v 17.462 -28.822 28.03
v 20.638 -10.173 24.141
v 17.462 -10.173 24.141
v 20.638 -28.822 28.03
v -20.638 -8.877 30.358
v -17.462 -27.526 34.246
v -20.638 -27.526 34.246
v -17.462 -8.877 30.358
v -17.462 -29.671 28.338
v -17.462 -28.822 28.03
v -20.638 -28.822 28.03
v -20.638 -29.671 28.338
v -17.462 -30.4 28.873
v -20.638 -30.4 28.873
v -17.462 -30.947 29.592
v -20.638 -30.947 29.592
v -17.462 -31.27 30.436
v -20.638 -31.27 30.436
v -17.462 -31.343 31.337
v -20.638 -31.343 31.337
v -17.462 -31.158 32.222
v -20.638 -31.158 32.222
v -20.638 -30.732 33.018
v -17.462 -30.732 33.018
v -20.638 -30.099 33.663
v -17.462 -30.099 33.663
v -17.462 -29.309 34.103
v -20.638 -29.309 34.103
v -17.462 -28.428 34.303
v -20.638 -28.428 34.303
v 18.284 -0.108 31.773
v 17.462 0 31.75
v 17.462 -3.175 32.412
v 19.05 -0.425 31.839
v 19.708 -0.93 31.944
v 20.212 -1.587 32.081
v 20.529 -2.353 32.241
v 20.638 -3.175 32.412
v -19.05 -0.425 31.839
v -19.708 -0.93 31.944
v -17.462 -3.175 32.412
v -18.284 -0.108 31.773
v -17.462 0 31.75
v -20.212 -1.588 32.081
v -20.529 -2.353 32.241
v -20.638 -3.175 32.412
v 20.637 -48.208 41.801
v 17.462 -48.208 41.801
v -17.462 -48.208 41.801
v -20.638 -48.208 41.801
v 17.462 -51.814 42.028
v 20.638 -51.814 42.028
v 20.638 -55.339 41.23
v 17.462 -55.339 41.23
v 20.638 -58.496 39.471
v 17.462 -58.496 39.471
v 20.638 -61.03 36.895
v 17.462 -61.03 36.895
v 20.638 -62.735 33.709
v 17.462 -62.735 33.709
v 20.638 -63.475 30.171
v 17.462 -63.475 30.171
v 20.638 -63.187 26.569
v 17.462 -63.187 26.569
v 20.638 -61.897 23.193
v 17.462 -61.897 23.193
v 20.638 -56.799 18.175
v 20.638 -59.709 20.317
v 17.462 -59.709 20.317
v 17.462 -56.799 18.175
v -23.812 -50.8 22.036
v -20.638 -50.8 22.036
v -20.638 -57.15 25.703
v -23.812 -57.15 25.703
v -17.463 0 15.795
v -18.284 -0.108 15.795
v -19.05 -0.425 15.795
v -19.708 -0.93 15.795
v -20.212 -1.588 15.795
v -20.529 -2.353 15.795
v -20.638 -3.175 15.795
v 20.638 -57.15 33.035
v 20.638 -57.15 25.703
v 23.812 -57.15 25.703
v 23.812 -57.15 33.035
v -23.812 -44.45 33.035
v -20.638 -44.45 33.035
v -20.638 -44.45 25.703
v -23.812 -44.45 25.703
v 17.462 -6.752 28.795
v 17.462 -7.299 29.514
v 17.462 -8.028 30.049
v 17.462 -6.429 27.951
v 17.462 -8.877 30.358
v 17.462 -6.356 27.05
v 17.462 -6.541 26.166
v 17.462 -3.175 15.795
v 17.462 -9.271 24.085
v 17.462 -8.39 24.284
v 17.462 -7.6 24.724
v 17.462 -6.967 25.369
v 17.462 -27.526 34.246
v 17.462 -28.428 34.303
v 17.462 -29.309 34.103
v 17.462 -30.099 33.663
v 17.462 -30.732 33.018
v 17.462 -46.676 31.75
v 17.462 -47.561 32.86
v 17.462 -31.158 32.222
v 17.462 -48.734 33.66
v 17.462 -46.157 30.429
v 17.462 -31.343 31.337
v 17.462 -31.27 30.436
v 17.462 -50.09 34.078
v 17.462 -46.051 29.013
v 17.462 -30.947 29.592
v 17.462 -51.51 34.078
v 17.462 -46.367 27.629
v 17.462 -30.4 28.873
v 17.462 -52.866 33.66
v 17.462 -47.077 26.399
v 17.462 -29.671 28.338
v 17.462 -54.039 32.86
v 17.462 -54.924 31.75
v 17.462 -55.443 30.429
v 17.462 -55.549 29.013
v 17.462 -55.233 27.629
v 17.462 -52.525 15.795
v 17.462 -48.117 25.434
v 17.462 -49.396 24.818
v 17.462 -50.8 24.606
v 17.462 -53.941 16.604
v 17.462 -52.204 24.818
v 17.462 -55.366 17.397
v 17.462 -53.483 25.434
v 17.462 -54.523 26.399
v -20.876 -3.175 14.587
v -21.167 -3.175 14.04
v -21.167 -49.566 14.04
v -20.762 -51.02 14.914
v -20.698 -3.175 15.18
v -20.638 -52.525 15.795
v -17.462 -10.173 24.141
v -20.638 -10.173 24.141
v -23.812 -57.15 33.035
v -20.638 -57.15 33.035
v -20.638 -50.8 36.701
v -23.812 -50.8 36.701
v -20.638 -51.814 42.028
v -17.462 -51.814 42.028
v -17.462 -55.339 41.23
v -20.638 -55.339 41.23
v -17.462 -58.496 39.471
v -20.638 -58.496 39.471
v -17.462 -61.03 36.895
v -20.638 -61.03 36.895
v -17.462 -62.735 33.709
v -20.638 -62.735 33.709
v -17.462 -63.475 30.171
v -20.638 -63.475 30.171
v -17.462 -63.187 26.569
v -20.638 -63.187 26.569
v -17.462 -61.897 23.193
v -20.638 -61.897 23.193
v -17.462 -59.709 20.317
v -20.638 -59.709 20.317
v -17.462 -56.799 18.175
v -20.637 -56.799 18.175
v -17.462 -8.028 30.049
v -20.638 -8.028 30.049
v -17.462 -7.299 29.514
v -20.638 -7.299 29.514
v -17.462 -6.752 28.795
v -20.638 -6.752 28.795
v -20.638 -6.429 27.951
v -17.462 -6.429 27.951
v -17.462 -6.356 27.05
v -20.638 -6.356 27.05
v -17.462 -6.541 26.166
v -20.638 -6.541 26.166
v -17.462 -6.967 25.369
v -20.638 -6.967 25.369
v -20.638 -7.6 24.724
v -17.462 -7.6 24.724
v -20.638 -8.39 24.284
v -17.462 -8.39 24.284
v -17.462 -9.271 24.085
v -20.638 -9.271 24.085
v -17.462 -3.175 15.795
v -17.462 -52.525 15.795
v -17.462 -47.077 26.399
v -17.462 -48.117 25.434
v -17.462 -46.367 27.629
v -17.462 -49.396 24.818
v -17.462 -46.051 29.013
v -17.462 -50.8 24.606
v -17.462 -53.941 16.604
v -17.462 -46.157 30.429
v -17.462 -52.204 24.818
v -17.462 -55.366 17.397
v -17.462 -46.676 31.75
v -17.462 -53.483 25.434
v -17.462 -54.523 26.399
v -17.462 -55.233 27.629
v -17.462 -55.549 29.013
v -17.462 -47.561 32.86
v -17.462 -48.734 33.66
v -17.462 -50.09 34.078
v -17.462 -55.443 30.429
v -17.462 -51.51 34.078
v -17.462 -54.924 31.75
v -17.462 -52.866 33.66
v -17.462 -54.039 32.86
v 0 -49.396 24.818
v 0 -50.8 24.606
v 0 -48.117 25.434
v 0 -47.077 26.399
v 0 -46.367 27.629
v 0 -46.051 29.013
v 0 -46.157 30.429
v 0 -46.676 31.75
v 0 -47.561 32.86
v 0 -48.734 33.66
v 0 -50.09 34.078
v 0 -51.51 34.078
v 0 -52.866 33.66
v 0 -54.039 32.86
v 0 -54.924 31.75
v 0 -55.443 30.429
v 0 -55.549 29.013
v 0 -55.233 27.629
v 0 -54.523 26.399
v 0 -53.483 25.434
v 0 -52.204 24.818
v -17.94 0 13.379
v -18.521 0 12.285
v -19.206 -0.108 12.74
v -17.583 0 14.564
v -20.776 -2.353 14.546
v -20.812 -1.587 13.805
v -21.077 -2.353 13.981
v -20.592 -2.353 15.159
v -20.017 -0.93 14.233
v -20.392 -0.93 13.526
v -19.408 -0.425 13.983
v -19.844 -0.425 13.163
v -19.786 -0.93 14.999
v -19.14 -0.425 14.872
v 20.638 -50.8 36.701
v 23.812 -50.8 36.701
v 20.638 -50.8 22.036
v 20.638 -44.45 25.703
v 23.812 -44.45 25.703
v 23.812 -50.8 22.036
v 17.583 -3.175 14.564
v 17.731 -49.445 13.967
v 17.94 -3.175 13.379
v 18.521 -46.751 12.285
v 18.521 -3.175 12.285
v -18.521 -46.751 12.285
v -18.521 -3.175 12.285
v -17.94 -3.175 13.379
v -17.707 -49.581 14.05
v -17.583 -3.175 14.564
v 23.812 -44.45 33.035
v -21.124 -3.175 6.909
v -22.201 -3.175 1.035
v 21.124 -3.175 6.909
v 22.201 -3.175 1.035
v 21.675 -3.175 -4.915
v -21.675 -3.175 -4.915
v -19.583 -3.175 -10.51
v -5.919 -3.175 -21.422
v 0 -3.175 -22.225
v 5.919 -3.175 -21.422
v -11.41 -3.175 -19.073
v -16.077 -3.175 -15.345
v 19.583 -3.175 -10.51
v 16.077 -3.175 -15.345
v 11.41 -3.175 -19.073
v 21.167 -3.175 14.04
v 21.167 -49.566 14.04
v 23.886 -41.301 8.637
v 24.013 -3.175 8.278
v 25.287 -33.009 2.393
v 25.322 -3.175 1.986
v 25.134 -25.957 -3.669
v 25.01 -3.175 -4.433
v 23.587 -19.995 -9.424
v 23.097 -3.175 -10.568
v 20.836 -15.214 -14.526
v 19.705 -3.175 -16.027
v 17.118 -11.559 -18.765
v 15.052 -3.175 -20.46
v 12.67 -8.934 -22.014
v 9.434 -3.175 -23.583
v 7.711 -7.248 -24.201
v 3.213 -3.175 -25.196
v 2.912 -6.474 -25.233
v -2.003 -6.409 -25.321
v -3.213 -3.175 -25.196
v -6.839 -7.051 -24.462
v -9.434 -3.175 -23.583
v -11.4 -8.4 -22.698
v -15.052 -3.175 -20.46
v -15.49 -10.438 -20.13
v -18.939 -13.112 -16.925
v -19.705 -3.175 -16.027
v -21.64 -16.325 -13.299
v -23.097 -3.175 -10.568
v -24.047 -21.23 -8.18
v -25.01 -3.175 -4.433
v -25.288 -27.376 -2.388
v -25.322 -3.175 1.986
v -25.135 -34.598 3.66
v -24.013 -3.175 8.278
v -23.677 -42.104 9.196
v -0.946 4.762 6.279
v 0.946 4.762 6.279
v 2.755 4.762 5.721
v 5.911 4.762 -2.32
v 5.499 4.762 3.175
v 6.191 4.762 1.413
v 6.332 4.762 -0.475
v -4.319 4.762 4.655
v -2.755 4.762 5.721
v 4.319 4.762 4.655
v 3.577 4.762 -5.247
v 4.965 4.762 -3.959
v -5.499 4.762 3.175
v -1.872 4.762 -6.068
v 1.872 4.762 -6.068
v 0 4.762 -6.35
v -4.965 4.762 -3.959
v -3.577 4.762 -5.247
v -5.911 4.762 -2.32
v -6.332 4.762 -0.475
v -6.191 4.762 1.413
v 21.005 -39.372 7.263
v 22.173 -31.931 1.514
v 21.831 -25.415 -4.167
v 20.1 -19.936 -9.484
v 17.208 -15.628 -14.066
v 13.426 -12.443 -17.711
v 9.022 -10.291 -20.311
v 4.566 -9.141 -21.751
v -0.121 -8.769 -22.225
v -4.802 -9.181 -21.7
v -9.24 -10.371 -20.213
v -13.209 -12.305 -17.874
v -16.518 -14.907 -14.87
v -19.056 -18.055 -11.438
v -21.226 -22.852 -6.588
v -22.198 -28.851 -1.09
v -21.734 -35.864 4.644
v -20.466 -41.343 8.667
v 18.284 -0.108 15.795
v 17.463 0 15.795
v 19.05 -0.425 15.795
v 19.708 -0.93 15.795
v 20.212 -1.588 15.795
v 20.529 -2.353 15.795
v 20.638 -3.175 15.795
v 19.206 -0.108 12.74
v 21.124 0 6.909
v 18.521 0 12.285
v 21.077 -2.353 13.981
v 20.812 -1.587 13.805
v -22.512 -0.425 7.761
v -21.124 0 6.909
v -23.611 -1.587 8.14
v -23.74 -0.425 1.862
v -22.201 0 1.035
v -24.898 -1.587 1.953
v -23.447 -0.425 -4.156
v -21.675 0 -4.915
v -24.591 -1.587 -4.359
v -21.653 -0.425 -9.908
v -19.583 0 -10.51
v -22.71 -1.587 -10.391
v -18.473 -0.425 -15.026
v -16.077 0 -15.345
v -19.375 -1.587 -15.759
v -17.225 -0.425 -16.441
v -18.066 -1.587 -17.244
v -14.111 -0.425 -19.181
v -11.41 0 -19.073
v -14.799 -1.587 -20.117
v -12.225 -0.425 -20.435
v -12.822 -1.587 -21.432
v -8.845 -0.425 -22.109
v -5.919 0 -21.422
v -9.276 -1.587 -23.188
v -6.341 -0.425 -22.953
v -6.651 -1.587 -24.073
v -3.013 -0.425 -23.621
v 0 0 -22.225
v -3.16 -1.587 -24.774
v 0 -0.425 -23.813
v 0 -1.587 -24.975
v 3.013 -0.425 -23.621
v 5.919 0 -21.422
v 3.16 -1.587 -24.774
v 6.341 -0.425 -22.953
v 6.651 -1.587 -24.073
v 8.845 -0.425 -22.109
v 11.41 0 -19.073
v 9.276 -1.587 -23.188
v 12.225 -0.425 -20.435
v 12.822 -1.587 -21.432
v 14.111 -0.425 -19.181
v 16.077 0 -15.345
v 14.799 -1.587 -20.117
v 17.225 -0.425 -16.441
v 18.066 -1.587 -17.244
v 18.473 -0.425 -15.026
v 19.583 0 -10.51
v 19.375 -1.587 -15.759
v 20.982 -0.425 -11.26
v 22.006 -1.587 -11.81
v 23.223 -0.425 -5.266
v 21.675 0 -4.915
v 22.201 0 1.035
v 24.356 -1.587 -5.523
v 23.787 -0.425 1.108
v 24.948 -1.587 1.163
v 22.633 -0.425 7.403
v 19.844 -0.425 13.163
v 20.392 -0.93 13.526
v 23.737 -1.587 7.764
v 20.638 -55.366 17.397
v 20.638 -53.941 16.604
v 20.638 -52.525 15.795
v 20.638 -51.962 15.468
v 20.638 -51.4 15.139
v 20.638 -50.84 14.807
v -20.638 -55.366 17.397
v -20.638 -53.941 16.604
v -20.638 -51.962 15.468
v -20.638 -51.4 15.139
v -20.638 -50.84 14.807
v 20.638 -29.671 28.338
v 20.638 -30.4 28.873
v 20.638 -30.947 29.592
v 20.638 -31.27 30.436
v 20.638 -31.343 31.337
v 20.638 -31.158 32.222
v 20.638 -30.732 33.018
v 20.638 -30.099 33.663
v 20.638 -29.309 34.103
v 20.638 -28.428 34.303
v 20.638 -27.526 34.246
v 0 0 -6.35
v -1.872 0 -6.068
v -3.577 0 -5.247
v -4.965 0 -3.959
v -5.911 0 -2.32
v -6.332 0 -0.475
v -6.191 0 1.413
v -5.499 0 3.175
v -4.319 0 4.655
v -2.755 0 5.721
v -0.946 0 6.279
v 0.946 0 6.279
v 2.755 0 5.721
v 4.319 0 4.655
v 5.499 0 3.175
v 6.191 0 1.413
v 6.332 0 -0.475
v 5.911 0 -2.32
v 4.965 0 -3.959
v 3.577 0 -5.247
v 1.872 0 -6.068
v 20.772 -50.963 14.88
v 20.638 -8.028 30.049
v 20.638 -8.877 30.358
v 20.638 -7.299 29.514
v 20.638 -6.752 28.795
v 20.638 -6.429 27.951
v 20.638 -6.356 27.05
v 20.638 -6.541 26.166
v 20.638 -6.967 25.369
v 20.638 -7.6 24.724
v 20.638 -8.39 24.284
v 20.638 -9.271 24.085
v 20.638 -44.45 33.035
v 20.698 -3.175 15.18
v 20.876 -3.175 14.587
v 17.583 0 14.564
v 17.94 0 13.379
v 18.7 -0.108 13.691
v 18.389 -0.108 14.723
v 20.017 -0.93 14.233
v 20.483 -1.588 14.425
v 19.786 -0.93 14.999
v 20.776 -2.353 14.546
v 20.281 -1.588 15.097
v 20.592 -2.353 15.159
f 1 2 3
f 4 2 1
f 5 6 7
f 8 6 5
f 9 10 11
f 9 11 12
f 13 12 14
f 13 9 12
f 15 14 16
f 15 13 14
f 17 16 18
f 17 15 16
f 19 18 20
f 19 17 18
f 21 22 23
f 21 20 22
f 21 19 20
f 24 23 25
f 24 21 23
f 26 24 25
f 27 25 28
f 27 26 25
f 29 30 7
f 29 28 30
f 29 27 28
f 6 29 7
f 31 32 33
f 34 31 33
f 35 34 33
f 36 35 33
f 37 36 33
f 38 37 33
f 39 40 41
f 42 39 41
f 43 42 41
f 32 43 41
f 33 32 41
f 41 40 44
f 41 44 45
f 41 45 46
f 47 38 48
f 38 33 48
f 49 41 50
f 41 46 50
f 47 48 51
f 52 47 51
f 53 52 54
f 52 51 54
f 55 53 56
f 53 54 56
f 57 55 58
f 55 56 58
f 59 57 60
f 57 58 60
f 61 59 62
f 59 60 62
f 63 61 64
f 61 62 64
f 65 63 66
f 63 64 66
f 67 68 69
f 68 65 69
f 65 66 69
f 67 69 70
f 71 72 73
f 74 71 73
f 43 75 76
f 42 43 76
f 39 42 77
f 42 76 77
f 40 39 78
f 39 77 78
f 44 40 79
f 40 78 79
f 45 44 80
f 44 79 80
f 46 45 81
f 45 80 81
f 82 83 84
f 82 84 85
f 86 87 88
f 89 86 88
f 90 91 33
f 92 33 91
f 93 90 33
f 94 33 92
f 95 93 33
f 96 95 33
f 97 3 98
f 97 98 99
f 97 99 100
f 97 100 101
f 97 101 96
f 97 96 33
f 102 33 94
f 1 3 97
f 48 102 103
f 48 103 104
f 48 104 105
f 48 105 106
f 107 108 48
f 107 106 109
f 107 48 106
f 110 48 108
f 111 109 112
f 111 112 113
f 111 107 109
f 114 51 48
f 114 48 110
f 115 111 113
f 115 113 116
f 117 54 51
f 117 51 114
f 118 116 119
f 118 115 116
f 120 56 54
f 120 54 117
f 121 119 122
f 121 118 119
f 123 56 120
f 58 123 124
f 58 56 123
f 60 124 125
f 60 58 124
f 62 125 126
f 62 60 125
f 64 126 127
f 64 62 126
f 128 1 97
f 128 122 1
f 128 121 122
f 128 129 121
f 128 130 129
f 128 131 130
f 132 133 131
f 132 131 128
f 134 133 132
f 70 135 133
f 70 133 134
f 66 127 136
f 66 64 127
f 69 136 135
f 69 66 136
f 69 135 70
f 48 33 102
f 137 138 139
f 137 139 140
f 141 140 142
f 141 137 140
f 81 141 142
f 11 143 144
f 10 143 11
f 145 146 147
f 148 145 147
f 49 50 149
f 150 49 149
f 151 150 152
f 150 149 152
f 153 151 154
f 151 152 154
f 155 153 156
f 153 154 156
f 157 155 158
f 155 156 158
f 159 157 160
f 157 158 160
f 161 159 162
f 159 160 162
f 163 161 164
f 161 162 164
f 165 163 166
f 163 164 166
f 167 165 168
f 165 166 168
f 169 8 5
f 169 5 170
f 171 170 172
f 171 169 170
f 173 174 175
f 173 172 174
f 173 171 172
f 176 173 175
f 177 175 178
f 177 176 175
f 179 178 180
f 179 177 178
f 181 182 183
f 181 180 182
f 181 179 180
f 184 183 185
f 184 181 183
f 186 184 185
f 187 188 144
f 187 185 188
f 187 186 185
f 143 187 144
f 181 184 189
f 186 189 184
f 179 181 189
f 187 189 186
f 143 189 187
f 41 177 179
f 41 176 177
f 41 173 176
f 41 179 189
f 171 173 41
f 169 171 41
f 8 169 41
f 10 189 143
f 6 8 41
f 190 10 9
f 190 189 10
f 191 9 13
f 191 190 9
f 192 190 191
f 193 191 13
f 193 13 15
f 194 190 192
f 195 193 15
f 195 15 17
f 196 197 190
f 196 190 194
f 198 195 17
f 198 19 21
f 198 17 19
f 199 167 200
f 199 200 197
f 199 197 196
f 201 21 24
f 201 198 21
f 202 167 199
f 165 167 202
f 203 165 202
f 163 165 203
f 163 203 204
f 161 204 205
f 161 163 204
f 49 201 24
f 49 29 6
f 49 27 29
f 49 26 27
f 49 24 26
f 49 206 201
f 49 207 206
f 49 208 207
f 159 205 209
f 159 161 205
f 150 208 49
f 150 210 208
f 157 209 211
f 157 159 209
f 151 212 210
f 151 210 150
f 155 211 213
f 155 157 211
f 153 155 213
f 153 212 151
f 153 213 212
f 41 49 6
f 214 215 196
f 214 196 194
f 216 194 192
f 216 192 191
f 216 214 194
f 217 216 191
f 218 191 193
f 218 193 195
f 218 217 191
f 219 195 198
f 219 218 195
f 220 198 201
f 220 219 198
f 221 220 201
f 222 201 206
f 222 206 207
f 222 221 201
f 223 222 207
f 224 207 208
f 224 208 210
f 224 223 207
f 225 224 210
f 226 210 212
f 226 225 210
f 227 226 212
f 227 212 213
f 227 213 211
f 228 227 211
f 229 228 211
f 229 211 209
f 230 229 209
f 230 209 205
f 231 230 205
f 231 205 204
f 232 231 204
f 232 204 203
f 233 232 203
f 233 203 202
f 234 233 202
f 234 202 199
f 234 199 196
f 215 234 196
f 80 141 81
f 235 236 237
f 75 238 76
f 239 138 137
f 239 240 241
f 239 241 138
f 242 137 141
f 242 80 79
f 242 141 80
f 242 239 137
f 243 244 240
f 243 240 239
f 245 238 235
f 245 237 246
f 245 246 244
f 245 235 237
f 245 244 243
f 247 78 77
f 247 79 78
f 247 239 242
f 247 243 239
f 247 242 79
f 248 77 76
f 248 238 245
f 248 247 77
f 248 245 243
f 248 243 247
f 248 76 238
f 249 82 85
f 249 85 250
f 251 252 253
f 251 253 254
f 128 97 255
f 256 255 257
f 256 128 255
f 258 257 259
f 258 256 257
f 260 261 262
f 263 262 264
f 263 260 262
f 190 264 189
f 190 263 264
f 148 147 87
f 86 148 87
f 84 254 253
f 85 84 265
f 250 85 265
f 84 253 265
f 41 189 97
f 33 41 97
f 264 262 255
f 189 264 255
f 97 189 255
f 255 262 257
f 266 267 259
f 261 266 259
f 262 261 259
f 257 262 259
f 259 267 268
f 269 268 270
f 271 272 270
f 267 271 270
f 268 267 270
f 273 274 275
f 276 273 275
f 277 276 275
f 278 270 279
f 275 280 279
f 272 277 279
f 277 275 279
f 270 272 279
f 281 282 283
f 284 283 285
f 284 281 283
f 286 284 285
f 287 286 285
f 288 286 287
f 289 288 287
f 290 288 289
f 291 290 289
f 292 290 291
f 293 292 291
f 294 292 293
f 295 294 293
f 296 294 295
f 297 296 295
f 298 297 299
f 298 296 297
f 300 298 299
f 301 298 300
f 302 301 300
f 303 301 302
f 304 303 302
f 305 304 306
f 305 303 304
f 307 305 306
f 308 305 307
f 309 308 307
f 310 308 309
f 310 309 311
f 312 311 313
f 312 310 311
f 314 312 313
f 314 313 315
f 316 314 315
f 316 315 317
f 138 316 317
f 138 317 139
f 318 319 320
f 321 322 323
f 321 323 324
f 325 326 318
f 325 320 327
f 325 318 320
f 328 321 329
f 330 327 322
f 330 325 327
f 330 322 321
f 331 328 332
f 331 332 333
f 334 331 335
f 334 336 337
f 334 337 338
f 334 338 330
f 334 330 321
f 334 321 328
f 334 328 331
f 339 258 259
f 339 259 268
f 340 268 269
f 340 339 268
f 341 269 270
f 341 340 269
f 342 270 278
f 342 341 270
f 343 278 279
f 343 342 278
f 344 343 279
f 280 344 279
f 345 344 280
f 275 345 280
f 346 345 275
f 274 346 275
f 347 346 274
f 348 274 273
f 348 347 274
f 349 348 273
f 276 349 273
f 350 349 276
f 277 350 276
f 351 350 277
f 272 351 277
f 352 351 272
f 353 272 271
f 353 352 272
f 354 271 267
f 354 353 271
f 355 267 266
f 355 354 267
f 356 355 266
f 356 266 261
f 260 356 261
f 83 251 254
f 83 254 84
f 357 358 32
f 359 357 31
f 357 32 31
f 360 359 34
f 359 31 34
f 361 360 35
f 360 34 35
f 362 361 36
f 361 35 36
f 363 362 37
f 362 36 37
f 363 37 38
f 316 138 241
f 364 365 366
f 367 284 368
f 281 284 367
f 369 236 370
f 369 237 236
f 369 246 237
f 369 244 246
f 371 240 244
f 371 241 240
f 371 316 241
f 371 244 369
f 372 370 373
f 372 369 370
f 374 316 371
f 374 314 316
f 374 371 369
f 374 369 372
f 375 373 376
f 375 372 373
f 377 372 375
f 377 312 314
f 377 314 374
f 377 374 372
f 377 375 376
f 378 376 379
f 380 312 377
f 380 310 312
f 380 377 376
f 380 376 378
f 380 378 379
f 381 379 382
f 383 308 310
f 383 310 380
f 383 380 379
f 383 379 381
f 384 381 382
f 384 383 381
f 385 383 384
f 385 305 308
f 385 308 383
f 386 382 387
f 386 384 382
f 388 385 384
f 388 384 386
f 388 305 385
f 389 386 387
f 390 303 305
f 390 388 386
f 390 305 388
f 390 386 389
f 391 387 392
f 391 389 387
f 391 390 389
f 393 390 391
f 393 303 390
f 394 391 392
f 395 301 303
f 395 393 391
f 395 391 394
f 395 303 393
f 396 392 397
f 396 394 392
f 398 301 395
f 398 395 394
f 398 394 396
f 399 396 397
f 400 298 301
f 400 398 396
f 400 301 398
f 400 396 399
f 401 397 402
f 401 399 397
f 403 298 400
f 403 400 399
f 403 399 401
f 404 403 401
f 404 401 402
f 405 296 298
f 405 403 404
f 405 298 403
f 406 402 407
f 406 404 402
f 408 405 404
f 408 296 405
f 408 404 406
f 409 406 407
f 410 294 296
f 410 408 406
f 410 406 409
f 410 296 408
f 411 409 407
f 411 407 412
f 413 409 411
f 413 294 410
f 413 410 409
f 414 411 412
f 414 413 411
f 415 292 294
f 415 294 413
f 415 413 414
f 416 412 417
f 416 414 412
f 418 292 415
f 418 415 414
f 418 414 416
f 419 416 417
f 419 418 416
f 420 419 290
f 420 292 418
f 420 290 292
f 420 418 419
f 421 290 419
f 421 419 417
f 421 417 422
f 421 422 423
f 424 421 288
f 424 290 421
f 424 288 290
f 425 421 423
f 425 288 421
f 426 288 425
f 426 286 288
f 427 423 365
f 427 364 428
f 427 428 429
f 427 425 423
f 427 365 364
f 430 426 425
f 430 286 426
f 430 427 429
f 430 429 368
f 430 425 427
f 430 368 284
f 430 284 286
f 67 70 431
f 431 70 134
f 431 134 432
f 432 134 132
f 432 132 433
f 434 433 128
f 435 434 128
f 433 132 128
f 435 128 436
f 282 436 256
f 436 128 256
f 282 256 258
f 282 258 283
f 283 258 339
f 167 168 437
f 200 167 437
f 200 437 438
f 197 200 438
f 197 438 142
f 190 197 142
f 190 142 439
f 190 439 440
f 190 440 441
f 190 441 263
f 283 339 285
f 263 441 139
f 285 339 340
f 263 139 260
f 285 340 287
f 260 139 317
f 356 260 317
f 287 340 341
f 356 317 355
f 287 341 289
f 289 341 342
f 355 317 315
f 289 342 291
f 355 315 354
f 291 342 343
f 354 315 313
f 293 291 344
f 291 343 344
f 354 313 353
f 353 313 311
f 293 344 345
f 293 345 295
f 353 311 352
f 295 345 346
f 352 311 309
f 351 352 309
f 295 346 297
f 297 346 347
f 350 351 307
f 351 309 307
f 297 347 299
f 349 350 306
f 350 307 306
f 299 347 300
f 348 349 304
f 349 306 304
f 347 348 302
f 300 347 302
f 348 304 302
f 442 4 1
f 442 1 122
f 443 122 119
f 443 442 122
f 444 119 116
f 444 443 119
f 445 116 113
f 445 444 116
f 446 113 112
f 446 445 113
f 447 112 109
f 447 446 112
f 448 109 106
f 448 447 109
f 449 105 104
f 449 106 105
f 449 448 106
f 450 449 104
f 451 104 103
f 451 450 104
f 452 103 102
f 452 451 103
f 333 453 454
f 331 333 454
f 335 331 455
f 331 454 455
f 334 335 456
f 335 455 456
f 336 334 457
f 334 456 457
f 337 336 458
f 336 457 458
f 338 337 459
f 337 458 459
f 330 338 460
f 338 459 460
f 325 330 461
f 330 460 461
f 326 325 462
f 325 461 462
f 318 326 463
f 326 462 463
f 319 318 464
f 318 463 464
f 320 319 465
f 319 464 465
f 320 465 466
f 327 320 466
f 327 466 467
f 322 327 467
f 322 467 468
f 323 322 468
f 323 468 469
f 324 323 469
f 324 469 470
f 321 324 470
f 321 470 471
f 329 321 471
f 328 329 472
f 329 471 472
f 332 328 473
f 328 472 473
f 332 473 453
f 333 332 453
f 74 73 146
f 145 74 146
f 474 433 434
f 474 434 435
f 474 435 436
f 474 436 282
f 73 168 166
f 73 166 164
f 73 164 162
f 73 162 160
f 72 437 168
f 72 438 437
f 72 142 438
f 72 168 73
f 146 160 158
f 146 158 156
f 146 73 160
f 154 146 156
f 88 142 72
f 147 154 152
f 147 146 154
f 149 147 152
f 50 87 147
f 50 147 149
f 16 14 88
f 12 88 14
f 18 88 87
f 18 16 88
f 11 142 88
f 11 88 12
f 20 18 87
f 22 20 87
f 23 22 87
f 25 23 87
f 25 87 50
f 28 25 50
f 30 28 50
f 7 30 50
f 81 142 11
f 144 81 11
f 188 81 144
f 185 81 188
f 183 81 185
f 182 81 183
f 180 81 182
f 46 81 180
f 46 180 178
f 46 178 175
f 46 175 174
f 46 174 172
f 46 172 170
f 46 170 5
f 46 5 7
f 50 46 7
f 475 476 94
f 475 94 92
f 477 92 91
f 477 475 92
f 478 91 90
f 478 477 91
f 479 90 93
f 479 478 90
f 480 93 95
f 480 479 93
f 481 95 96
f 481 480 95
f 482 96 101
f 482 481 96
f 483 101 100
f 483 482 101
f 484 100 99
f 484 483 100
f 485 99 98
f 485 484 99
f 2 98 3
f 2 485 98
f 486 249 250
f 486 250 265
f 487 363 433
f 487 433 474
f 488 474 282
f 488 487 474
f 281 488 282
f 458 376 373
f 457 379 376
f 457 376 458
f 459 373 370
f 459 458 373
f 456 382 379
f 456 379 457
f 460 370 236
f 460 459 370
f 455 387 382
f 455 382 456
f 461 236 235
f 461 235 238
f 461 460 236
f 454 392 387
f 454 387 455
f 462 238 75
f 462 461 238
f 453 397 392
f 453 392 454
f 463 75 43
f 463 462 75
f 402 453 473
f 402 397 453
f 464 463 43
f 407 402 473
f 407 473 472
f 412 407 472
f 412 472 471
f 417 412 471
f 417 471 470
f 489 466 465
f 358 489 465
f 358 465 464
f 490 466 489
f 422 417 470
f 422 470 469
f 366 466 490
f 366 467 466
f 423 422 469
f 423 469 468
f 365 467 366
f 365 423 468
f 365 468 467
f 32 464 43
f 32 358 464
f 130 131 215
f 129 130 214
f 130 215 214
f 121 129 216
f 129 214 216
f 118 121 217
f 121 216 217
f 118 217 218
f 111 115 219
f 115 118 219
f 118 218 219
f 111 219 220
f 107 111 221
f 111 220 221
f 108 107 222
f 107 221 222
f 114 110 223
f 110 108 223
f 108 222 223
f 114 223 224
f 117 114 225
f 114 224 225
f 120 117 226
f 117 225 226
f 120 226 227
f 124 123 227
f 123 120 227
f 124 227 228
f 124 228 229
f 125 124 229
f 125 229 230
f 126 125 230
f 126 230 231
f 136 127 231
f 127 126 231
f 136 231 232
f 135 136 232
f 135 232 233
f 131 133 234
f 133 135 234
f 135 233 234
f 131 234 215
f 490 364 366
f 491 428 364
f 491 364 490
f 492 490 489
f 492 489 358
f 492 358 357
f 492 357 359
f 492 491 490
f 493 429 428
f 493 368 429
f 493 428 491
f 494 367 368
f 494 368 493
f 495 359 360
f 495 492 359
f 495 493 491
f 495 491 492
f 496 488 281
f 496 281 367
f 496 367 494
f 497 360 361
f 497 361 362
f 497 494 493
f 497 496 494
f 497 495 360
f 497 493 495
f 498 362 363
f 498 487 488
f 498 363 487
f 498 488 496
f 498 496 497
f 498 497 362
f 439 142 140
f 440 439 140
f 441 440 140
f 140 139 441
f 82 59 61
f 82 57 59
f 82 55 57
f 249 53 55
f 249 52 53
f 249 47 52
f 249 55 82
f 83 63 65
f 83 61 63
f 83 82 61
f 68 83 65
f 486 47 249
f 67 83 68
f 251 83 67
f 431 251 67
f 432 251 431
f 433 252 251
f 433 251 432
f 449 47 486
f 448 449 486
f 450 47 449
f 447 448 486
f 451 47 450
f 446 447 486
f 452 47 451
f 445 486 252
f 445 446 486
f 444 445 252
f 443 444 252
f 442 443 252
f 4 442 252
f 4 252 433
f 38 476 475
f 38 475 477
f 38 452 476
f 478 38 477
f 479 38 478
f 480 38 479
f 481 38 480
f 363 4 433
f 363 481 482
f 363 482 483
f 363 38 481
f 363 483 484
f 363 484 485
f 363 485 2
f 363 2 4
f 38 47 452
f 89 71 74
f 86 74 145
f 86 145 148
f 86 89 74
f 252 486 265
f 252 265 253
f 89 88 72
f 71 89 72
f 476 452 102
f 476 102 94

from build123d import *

# Parameters (mm, degrees)
BASE_EXTRUDE_DEPTH              = 33.02
SKETCH3_OUTSIDE_W               = 90.796
SKETCH3_OUTSIDE_H               = 92.225
CUT_EXTRUDE1_DEPTH              = 84.020179032
FILLET1_R                       = 3.175
SHELL1_START                    = -64
SHELL1_DEPTH                    = 60.825
CUT_EXTRUDE2_DEPTH              = 90.002703004
BOSS_EXTRUDE2_REACH             = 82.294
SKETCH5_R                       = 4.7625
BOSS_EXTRUDE2_DIRECTION_2_REACH = 82.294
BOSS_EXTRUDE3_DEPTH             = 3.175
SKETCH7_R                       = 6.35
BOSS_EXTRUDE4_DEPTH             = 4.7625


with BuildPart() as part:
    # Sketch2 → Base-Extrude (new, symmetric)
    with BuildSketch(Plane.ZY):
        with BuildLine():
            Line((-25.4, 0), (31.75, 0))
            Line((31.75, 0), (41.801384237, -48.20777973))
            ThreePointArc((41.801384237, -48.20777973), (33.708556891, -62.735496477), (18.174681196, -56.798568464))
            ThreePointArc((18.174681196, -56.798568464), (-0.820496403, -29.162568375), (-25.4, -6.35))
            Line((-25.4, -6.35), (-25.4, 0))
        make_face()
    extrude(amount=BASE_EXTRUDE_DEPTH, both=True)

    # Sketch3 outside → Cut-Extrude1 (cut, through all)
    with BuildSketch(Plane(origin=(0, 0, 0), x_dir=(-1, 0, 0), z_dir=(0, 1, 0))):
        with Locations((0, 8.3345)):
            Rectangle(SKETCH3_OUTSIDE_W, SKETCH3_OUTSIDE_H)
        with BuildLine():
            Line((20.6375, 14.807214247), (20.6375, 48.151384237))
            Line((20.6375, 48.151384237), (-20.6375, 48.151384237))
            Line((-20.6375, 48.151384237), (-20.6375, 14.807214247))
            ThreePointArc((-20.6375, 14.807214247), (0, -25.4), (20.6375, 14.807214247))
        make_face(mode=Mode.SUBTRACT)
    extrude(amount=-CUT_EXTRUDE1_DEPTH, mode=Mode.SUBTRACT)

    # Fillet1
    # the kernel refuses this fillet: 3.175 mm, written as the material it adds along each edge
    with BuildSketch(Plane(origin=(20.6375, 0, 14.807214247), x_dir=(0.567961525786319, 0, -0.8230551046111534), z_dir=(0, -1, 0))) as fillet1_piece_1_section:
        with BuildLine():
            CenterArc((0.989925475, 3.174465965), FILLET1_R, 235.391801271, 33.557309762)
            Line((-0.813352369, 0.561266008), (0, 0))
            ThreePointArc((0, 0), (0.465847282, 0.004272282), (0.931694565, 0))
        make_face()
    fillet1_piece_1 = extrude(amount=53.310385567, mode=Mode.PRIVATE)
    fillet1_piece_1 = fillet1_piece_1 - Plane(origin=(20.6375, -128.781390034, -116.154144448), x_dir=(0, 0.4723282255219985, 0.8814227404459453), z_dir=(-1, 0, 0)) * Cylinder(152.4, 111, mode=Mode.PRIVATE)
    add(fillet1_piece_1)
    with BuildSketch(Plane(origin=(-20.6375, 0, 14.807214247), x_dir=(-0.5679615257863165, 0, -0.8230551046111549), z_dir=(0, -1, 0))) as fillet1_piece_2_section:
        with BuildLine():
            CenterArc((0.989925475, -3.174465965), FILLET1_R, 91.050888967, 33.557309762)
            Line((-0.813352369, -0.561266008), (0, 0))
            ThreePointArc((0, 0), (0.465847282, -0.004272282), (0.931694565, 0))
        make_face()
    fillet1_piece_2 = extrude(amount=53.310385567, mode=Mode.PRIVATE)
    fillet1_piece_2 = fillet1_piece_2 - Plane(origin=(-20.6375, -128.781390034, -116.154144448), x_dir=(0, 0.4723282255219985, 0.8814227404459453), z_dir=(-1, 0, 0)) * Cylinder(152.4, 111, mode=Mode.PRIVATE)
    add(fillet1_piece_2)
    # the kernel refuses this fillet: 3.175 mm, written as the material it takes off along each edge
    with BuildSketch(Plane(origin=(0, 0, 0), x_dir=(-0.8333333333333335, 0, 0.5527707983925666), z_dir=(0.5527707983925666, 0, 0.8333333333333335))) as fillet1_2_piece_1:
        with BuildLine():
            CenterArc((25.4 - FILLET1_R, FILLET1_R), FILLET1_R, 270, 90)
            Line((25.4 - FILLET1_R, 0), (25.4, 0))
            Line((25.4, 0), (25.4, FILLET1_R))
        make_face()
    revolve(axis=Axis((0, 0, 0), (0, -1, 0)), revolution_arc=247.114619524, mode=Mode.SUBTRACT)
    with BuildSketch(Plane(origin=(20.6375, 0, 39.6875), x_dir=(-1, 0, 0), z_dir=(0, 0, -1)), Plane(origin=(-20.6375, 0, 15.795425564), x_dir=(1, 0, 0), z_dir=(0, 0, 1))) as fillet1_2_piece_2:
        with BuildLine():
            CenterArc((FILLET1_R, -FILLET1_R), FILLET1_R, 90, 90)
            Line((0, -FILLET1_R), (0, 0))
            Line((0, 0), (FILLET1_R, 0))
        make_face()
    extrude(amount=23.892074436, mode=Mode.SUBTRACT)
    with BuildSketch(Plane(origin=(-23.8125, 0, 15.795425564), x_dir=(0.8333333333333333, 0, -0.5527707983925668), z_dir=(-0.5527707983925668, 0, -0.8333333333333333))) as fillet1_2_piece_3:
        with BuildLine():
            CenterArc((3.175 + FILLET1_R, FILLET1_R), FILLET1_R, 180, 90)
            Line((3.175, FILLET1_R), (3.175, 0))
            Line((3.175, 0), (3.175 + FILLET1_R, 0))
        make_face()
    revolve(axis=Axis((-23.8125, 0, 15.795425564), (0, -1, 0)), revolution_arc=33.557309762, mode=Mode.SUBTRACT)
    with BuildSketch(Plane(origin=(23.8125, 0, 15.795425564), x_dir=(-0.8333333333333333, 0, -0.5527707983925668), z_dir=(0.5527707983925668, 0, -0.8333333333333333))) as fillet1_2_piece_4:
        with BuildLine():
            CenterArc((3.175 + FILLET1_R, -FILLET1_R), FILLET1_R, 90, 90)
            Line((3.175, -FILLET1_R), (3.175, 0))
            Line((3.175, 0), (3.175 + FILLET1_R, 0))
        make_face()
    revolve(axis=Axis((23.8125, 0, 15.795425564), (0, 1, 0)), revolution_arc=33.557309762, mode=Mode.SUBTRACT)

    # Shell1: read off the stored shape, not the designer's step
    # Shell1 outline → Shell1 (cut)
    with BuildSketch(Plane(origin=(0, 0, 0), x_dir=(1, 0, 0), z_dir=(0, 1, 0)).offset(SHELL1_START)):
        with BuildLine():
            ThreePointArc((17.4625, -15.795425564), (17.732837866, -13.962338459), (18.520833333, -12.285330994))
            ThreePointArc((18.520833333, -12.285330994), (0, 22.225), (-18.520833333, -12.285330994))
            ThreePointArc((-18.520833333, -12.285330994), (-17.732837866, -13.962338459), (-17.4625, -15.795425564))
            Line((-17.4625, -15.795425564), (-17.4625, -44))
            Line((-17.4625, -44), (17.4625, -44))
            Line((17.4625, -44), (17.4625, -15.795425564))
        make_face()
    extrude(amount=SHELL1_DEPTH, mode=Mode.SUBTRACT)

    # Sketch4 → Cut-Extrude2 (cut, through all)
    with BuildSketch(Plane.ZY.offset(-20.6375)):
        with BuildLine():
            Line((24.14125847, -10.173055068), (28.029588875, -28.822006423))
            ThreePointArc((28.029588875, -28.822006423), (31.785802502, -31.282109915), (34.245905994, -27.525896288))
            Line((34.245905994, -27.525896288), (30.357575589, -8.876944932))
            ThreePointArc((30.357575589, -8.876944932), (26.601361962, -6.416841441), (24.14125847, -10.173055068))
        make_face()
    extrude(amount=CUT_EXTRUDE2_DEPTH, mode=Mode.SUBTRACT)

    # Sketch5 → Boss-Extrude2 (add, up to next)
    with BuildSketch(Plane(origin=(0, 0, 0), x_dir=(0, 0, -1), z_dir=(1, 0, 0)), mode=Mode.PRIVATE) as boss_extrude2_sk1:
        with Locations((-29.36875, -50.8)):
            Circle(SKETCH5_R)
    boss_extrude2_tool1 = extrude(boss_extrude2_sk1.sketch, amount=BOSS_EXTRUDE2_REACH, mode=Mode.PRIVATE) - part.part
    add(boss_extrude2_tool1.solids().sort_by_distance((0, -50.8, 29.36875))[0])

    # Sketch5 → Boss-Extrude2 direction 2 (add, up to next)
    with BuildSketch(Plane(origin=(0, 0, 0), x_dir=(0, 0, -1), z_dir=(1, 0, 0)), mode=Mode.PRIVATE) as boss_extrude2_direction_2_sk1:
        with Locations((-29.36875, -50.8)):
            Circle(SKETCH5_R)
    boss_extrude2_direction_2_tool1 = extrude(boss_extrude2_direction_2_sk1.sketch, amount=-BOSS_EXTRUDE2_DIRECTION_2_REACH, mode=Mode.PRIVATE) - part.part
    add(boss_extrude2_direction_2_tool1.solids().sort_by_distance((0, -50.8, 29.36875))[0])

    # Sketch6 → Boss-Extrude3 (add)
    with BuildSketch(Plane.ZY.offset(20.6375)):
        Polygon((33.034924209, -44.45), (25.702575791, -44.45), (22.036401581, -50.8), (25.702575791, -57.15), (33.034924209, -57.15), (36.701098419, -50.8), align=None)
    boss_extrude3 = extrude(amount=BOSS_EXTRUDE3_DEPTH)

    # Mirror1: Boss-Extrude3 across plane
    add(boss_extrude3.mirror(Plane(origin=(0, 0, 0), x_dir=(0, 0, 1), z_dir=(1, 0, 0))))

    # Sketch7 → Boss-Extrude4 (add)
    with BuildSketch(Plane(origin=(0, 0, 0), x_dir=(-1, 0, 0), z_dir=(0, 1, 0))):
        with Locations(Location((0, 0, 0), (0, 0, 270))):
            Circle(SKETCH7_R)
    extrude(amount=BOSS_EXTRUDE4_DEPTH)


solid = part.part
